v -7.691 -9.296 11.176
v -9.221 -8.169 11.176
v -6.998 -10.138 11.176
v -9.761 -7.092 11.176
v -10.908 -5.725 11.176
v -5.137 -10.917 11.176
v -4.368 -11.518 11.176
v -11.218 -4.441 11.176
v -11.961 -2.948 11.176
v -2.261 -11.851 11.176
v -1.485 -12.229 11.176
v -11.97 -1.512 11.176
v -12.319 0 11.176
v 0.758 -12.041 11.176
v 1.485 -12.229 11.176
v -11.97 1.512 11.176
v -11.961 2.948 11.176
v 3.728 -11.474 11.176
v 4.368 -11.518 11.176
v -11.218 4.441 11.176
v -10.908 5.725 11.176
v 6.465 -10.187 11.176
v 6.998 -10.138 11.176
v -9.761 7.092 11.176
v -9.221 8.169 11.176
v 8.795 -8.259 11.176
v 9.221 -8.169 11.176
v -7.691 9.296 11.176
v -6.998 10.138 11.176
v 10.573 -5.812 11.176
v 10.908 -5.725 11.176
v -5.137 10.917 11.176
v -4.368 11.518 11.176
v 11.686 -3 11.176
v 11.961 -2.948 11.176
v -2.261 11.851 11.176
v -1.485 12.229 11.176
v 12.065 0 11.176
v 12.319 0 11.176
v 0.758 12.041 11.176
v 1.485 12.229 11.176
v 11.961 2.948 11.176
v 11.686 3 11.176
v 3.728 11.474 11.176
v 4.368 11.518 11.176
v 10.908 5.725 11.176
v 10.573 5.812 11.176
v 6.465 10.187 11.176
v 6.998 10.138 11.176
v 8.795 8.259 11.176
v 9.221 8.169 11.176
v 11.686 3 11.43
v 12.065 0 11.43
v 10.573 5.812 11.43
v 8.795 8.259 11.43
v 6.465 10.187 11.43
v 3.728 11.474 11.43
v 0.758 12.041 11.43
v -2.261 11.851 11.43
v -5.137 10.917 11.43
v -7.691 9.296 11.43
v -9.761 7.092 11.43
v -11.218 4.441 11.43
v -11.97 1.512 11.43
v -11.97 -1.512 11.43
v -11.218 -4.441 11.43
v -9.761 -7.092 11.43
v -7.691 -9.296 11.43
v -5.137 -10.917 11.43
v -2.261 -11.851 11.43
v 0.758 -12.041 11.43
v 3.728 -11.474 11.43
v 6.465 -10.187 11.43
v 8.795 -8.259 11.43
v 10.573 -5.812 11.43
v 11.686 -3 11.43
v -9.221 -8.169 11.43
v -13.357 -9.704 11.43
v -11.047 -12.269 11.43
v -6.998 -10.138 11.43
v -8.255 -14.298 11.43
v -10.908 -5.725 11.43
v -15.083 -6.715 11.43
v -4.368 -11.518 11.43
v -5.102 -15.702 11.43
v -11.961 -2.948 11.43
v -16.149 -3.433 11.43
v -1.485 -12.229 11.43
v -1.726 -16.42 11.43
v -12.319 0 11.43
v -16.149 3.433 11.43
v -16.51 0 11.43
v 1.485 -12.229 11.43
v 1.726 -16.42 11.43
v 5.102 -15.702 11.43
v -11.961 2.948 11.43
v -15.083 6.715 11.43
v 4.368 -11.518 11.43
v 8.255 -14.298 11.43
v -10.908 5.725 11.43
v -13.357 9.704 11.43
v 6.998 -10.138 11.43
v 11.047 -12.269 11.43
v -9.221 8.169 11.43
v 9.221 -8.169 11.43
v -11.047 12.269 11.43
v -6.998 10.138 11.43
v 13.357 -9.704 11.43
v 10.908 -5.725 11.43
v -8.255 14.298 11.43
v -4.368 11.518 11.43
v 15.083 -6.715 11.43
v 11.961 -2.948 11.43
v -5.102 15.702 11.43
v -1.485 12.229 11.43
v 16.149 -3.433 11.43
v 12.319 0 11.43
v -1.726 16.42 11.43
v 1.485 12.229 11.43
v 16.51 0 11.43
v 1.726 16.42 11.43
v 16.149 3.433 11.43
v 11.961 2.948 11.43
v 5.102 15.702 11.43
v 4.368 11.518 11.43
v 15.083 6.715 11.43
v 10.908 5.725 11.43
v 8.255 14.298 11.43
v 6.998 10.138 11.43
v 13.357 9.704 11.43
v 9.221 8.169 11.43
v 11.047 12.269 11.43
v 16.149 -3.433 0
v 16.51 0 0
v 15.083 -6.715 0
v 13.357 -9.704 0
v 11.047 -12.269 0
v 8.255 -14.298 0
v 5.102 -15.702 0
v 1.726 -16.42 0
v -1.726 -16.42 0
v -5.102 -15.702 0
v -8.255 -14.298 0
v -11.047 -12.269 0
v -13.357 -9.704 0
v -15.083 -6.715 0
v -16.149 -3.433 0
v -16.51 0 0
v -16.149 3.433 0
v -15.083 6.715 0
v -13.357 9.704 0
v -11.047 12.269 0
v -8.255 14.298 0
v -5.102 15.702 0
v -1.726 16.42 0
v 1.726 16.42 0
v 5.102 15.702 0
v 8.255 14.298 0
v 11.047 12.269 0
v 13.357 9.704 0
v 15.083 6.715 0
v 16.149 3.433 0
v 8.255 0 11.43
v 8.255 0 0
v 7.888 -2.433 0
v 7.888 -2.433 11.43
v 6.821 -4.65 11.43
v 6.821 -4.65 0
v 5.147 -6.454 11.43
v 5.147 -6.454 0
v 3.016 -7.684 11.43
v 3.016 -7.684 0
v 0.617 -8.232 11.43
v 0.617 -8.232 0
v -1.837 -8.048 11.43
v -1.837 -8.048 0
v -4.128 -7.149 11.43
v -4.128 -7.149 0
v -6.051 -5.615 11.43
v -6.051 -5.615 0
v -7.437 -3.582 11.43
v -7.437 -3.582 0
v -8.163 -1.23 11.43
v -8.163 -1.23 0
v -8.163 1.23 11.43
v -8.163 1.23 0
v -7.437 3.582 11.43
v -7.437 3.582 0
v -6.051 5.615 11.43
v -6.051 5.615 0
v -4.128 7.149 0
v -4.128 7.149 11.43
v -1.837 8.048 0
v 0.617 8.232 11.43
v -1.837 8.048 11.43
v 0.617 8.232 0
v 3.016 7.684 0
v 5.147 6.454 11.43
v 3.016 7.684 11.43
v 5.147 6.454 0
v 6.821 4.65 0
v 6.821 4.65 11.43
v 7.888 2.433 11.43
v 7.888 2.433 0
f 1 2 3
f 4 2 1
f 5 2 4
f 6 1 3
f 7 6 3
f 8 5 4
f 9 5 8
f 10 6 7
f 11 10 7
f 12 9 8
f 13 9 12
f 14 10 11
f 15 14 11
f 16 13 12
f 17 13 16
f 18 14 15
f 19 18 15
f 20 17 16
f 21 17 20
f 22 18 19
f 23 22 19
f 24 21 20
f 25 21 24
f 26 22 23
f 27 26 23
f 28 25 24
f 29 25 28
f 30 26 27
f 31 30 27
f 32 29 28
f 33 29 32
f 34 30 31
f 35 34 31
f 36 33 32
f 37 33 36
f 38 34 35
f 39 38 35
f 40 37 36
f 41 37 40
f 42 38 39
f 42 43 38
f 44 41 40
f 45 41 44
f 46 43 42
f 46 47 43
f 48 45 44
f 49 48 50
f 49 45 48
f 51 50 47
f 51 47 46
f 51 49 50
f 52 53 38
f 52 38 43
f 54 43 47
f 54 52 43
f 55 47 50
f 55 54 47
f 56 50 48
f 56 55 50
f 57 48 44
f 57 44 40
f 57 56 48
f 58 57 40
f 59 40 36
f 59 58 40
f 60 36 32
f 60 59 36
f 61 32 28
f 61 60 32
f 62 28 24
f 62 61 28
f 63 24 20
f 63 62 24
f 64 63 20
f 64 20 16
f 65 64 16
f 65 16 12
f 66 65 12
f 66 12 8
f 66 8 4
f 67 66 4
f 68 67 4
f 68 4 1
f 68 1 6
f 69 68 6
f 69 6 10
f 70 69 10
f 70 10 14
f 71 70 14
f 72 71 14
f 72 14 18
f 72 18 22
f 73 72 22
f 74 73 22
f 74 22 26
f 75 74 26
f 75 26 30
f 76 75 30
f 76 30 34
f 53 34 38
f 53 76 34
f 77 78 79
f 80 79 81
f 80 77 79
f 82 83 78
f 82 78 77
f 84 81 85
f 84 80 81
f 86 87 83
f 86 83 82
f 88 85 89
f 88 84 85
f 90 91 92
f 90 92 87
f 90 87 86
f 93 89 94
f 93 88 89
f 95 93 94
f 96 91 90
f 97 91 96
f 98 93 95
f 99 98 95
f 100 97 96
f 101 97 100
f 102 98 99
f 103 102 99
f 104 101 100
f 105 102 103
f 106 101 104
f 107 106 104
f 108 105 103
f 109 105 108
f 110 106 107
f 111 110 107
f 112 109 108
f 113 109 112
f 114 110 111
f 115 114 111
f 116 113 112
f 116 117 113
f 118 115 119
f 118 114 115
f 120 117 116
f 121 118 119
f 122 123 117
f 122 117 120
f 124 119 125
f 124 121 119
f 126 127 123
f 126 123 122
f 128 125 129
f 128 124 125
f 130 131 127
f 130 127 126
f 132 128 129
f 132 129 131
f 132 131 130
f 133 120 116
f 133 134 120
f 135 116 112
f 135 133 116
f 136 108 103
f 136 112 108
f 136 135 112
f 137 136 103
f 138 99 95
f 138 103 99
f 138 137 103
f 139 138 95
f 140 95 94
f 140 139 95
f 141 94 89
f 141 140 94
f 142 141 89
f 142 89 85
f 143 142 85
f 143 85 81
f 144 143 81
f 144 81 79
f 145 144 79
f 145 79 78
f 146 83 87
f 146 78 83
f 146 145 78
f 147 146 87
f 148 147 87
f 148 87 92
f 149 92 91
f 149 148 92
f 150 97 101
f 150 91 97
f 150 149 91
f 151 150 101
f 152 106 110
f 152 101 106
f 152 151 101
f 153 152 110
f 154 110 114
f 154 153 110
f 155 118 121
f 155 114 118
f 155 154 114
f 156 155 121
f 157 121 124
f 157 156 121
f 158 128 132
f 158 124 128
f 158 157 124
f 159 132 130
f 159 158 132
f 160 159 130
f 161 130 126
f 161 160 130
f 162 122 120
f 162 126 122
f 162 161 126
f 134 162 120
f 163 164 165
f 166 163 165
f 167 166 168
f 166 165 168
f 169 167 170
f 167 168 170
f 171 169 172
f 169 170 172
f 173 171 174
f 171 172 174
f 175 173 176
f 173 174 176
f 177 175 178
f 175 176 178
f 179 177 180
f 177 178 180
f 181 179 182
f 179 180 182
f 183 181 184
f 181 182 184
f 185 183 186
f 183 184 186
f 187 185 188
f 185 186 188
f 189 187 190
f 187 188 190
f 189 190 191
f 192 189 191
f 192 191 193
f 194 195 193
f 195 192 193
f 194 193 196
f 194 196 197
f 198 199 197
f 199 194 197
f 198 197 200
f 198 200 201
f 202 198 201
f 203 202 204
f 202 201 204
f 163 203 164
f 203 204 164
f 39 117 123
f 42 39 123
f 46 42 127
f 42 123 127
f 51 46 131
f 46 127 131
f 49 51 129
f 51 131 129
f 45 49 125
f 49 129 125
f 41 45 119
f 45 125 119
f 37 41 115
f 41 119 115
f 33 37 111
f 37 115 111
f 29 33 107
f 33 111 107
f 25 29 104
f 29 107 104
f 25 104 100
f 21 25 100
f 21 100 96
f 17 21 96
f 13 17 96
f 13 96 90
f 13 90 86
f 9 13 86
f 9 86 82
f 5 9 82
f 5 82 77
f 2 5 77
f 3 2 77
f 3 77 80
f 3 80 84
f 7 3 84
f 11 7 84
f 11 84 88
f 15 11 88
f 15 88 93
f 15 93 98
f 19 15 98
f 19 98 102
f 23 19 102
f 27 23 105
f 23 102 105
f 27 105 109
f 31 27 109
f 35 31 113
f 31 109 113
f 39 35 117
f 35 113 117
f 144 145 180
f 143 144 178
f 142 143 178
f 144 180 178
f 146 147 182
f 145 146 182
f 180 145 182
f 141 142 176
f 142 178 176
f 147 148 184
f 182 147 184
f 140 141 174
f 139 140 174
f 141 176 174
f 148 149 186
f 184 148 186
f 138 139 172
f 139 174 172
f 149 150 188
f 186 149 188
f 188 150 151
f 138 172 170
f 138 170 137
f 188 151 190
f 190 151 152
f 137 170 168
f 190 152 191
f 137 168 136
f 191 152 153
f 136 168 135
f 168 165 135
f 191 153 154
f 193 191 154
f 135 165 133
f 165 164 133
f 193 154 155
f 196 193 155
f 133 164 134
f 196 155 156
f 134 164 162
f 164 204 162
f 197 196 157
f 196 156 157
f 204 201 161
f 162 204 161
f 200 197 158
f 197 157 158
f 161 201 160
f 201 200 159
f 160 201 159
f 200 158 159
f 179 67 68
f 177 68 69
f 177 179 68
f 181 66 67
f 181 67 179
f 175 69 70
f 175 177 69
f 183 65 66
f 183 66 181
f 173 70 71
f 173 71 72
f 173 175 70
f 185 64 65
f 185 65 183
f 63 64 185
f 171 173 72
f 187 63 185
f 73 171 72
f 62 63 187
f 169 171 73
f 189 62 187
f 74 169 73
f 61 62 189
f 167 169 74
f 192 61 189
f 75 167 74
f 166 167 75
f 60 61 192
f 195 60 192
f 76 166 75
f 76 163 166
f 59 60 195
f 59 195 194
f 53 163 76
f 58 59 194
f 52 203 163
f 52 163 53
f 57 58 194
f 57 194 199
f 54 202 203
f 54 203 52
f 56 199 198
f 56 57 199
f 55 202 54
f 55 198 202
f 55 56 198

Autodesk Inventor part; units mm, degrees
ref_plane "YZ Plane" through (0, 0, 0) normal (1, 0, 0) x (0, 1, 0)
ref_plane "XZ Plane" through (0, 0, 0) normal (0, 1, 0) x (-1, 0, 0)
ref_plane "XY Plane" through (0, 0, 0) normal (0, 0, 1) x (1, 0, 0)
sketch "Sketch1" plane through (0, 0, 0) normal (0, 0, 1) x (1, 0, 0)
  circle A0 centre (0, 0) radius 16.51
  circle A1 centre (0, 0) radius 8.255
  dimension "d0" = 33.02
  dimension "d3" = 16.51
extrude "Extrusion2" add sketch "Sketch1" along normal blind 11.43
sketch "Sketch2" plane through (0, 0, 11.43) normal (0, 0, 1) x (1, 0, 0)
  circle A0 centre (0, 0) radius 12.065
  circle A1 centre (0, 0) radius 12.319
  circle A2 centre (0, 0) radius 8.255 projected
  dimension "d6" = 0.254
  dimension "d8" = 3.81
extrude "Extrusion3" cut sketch "Sketch2" against normal blind 0.254 contours A1
properties part number "RobotArm ShaftColar"
